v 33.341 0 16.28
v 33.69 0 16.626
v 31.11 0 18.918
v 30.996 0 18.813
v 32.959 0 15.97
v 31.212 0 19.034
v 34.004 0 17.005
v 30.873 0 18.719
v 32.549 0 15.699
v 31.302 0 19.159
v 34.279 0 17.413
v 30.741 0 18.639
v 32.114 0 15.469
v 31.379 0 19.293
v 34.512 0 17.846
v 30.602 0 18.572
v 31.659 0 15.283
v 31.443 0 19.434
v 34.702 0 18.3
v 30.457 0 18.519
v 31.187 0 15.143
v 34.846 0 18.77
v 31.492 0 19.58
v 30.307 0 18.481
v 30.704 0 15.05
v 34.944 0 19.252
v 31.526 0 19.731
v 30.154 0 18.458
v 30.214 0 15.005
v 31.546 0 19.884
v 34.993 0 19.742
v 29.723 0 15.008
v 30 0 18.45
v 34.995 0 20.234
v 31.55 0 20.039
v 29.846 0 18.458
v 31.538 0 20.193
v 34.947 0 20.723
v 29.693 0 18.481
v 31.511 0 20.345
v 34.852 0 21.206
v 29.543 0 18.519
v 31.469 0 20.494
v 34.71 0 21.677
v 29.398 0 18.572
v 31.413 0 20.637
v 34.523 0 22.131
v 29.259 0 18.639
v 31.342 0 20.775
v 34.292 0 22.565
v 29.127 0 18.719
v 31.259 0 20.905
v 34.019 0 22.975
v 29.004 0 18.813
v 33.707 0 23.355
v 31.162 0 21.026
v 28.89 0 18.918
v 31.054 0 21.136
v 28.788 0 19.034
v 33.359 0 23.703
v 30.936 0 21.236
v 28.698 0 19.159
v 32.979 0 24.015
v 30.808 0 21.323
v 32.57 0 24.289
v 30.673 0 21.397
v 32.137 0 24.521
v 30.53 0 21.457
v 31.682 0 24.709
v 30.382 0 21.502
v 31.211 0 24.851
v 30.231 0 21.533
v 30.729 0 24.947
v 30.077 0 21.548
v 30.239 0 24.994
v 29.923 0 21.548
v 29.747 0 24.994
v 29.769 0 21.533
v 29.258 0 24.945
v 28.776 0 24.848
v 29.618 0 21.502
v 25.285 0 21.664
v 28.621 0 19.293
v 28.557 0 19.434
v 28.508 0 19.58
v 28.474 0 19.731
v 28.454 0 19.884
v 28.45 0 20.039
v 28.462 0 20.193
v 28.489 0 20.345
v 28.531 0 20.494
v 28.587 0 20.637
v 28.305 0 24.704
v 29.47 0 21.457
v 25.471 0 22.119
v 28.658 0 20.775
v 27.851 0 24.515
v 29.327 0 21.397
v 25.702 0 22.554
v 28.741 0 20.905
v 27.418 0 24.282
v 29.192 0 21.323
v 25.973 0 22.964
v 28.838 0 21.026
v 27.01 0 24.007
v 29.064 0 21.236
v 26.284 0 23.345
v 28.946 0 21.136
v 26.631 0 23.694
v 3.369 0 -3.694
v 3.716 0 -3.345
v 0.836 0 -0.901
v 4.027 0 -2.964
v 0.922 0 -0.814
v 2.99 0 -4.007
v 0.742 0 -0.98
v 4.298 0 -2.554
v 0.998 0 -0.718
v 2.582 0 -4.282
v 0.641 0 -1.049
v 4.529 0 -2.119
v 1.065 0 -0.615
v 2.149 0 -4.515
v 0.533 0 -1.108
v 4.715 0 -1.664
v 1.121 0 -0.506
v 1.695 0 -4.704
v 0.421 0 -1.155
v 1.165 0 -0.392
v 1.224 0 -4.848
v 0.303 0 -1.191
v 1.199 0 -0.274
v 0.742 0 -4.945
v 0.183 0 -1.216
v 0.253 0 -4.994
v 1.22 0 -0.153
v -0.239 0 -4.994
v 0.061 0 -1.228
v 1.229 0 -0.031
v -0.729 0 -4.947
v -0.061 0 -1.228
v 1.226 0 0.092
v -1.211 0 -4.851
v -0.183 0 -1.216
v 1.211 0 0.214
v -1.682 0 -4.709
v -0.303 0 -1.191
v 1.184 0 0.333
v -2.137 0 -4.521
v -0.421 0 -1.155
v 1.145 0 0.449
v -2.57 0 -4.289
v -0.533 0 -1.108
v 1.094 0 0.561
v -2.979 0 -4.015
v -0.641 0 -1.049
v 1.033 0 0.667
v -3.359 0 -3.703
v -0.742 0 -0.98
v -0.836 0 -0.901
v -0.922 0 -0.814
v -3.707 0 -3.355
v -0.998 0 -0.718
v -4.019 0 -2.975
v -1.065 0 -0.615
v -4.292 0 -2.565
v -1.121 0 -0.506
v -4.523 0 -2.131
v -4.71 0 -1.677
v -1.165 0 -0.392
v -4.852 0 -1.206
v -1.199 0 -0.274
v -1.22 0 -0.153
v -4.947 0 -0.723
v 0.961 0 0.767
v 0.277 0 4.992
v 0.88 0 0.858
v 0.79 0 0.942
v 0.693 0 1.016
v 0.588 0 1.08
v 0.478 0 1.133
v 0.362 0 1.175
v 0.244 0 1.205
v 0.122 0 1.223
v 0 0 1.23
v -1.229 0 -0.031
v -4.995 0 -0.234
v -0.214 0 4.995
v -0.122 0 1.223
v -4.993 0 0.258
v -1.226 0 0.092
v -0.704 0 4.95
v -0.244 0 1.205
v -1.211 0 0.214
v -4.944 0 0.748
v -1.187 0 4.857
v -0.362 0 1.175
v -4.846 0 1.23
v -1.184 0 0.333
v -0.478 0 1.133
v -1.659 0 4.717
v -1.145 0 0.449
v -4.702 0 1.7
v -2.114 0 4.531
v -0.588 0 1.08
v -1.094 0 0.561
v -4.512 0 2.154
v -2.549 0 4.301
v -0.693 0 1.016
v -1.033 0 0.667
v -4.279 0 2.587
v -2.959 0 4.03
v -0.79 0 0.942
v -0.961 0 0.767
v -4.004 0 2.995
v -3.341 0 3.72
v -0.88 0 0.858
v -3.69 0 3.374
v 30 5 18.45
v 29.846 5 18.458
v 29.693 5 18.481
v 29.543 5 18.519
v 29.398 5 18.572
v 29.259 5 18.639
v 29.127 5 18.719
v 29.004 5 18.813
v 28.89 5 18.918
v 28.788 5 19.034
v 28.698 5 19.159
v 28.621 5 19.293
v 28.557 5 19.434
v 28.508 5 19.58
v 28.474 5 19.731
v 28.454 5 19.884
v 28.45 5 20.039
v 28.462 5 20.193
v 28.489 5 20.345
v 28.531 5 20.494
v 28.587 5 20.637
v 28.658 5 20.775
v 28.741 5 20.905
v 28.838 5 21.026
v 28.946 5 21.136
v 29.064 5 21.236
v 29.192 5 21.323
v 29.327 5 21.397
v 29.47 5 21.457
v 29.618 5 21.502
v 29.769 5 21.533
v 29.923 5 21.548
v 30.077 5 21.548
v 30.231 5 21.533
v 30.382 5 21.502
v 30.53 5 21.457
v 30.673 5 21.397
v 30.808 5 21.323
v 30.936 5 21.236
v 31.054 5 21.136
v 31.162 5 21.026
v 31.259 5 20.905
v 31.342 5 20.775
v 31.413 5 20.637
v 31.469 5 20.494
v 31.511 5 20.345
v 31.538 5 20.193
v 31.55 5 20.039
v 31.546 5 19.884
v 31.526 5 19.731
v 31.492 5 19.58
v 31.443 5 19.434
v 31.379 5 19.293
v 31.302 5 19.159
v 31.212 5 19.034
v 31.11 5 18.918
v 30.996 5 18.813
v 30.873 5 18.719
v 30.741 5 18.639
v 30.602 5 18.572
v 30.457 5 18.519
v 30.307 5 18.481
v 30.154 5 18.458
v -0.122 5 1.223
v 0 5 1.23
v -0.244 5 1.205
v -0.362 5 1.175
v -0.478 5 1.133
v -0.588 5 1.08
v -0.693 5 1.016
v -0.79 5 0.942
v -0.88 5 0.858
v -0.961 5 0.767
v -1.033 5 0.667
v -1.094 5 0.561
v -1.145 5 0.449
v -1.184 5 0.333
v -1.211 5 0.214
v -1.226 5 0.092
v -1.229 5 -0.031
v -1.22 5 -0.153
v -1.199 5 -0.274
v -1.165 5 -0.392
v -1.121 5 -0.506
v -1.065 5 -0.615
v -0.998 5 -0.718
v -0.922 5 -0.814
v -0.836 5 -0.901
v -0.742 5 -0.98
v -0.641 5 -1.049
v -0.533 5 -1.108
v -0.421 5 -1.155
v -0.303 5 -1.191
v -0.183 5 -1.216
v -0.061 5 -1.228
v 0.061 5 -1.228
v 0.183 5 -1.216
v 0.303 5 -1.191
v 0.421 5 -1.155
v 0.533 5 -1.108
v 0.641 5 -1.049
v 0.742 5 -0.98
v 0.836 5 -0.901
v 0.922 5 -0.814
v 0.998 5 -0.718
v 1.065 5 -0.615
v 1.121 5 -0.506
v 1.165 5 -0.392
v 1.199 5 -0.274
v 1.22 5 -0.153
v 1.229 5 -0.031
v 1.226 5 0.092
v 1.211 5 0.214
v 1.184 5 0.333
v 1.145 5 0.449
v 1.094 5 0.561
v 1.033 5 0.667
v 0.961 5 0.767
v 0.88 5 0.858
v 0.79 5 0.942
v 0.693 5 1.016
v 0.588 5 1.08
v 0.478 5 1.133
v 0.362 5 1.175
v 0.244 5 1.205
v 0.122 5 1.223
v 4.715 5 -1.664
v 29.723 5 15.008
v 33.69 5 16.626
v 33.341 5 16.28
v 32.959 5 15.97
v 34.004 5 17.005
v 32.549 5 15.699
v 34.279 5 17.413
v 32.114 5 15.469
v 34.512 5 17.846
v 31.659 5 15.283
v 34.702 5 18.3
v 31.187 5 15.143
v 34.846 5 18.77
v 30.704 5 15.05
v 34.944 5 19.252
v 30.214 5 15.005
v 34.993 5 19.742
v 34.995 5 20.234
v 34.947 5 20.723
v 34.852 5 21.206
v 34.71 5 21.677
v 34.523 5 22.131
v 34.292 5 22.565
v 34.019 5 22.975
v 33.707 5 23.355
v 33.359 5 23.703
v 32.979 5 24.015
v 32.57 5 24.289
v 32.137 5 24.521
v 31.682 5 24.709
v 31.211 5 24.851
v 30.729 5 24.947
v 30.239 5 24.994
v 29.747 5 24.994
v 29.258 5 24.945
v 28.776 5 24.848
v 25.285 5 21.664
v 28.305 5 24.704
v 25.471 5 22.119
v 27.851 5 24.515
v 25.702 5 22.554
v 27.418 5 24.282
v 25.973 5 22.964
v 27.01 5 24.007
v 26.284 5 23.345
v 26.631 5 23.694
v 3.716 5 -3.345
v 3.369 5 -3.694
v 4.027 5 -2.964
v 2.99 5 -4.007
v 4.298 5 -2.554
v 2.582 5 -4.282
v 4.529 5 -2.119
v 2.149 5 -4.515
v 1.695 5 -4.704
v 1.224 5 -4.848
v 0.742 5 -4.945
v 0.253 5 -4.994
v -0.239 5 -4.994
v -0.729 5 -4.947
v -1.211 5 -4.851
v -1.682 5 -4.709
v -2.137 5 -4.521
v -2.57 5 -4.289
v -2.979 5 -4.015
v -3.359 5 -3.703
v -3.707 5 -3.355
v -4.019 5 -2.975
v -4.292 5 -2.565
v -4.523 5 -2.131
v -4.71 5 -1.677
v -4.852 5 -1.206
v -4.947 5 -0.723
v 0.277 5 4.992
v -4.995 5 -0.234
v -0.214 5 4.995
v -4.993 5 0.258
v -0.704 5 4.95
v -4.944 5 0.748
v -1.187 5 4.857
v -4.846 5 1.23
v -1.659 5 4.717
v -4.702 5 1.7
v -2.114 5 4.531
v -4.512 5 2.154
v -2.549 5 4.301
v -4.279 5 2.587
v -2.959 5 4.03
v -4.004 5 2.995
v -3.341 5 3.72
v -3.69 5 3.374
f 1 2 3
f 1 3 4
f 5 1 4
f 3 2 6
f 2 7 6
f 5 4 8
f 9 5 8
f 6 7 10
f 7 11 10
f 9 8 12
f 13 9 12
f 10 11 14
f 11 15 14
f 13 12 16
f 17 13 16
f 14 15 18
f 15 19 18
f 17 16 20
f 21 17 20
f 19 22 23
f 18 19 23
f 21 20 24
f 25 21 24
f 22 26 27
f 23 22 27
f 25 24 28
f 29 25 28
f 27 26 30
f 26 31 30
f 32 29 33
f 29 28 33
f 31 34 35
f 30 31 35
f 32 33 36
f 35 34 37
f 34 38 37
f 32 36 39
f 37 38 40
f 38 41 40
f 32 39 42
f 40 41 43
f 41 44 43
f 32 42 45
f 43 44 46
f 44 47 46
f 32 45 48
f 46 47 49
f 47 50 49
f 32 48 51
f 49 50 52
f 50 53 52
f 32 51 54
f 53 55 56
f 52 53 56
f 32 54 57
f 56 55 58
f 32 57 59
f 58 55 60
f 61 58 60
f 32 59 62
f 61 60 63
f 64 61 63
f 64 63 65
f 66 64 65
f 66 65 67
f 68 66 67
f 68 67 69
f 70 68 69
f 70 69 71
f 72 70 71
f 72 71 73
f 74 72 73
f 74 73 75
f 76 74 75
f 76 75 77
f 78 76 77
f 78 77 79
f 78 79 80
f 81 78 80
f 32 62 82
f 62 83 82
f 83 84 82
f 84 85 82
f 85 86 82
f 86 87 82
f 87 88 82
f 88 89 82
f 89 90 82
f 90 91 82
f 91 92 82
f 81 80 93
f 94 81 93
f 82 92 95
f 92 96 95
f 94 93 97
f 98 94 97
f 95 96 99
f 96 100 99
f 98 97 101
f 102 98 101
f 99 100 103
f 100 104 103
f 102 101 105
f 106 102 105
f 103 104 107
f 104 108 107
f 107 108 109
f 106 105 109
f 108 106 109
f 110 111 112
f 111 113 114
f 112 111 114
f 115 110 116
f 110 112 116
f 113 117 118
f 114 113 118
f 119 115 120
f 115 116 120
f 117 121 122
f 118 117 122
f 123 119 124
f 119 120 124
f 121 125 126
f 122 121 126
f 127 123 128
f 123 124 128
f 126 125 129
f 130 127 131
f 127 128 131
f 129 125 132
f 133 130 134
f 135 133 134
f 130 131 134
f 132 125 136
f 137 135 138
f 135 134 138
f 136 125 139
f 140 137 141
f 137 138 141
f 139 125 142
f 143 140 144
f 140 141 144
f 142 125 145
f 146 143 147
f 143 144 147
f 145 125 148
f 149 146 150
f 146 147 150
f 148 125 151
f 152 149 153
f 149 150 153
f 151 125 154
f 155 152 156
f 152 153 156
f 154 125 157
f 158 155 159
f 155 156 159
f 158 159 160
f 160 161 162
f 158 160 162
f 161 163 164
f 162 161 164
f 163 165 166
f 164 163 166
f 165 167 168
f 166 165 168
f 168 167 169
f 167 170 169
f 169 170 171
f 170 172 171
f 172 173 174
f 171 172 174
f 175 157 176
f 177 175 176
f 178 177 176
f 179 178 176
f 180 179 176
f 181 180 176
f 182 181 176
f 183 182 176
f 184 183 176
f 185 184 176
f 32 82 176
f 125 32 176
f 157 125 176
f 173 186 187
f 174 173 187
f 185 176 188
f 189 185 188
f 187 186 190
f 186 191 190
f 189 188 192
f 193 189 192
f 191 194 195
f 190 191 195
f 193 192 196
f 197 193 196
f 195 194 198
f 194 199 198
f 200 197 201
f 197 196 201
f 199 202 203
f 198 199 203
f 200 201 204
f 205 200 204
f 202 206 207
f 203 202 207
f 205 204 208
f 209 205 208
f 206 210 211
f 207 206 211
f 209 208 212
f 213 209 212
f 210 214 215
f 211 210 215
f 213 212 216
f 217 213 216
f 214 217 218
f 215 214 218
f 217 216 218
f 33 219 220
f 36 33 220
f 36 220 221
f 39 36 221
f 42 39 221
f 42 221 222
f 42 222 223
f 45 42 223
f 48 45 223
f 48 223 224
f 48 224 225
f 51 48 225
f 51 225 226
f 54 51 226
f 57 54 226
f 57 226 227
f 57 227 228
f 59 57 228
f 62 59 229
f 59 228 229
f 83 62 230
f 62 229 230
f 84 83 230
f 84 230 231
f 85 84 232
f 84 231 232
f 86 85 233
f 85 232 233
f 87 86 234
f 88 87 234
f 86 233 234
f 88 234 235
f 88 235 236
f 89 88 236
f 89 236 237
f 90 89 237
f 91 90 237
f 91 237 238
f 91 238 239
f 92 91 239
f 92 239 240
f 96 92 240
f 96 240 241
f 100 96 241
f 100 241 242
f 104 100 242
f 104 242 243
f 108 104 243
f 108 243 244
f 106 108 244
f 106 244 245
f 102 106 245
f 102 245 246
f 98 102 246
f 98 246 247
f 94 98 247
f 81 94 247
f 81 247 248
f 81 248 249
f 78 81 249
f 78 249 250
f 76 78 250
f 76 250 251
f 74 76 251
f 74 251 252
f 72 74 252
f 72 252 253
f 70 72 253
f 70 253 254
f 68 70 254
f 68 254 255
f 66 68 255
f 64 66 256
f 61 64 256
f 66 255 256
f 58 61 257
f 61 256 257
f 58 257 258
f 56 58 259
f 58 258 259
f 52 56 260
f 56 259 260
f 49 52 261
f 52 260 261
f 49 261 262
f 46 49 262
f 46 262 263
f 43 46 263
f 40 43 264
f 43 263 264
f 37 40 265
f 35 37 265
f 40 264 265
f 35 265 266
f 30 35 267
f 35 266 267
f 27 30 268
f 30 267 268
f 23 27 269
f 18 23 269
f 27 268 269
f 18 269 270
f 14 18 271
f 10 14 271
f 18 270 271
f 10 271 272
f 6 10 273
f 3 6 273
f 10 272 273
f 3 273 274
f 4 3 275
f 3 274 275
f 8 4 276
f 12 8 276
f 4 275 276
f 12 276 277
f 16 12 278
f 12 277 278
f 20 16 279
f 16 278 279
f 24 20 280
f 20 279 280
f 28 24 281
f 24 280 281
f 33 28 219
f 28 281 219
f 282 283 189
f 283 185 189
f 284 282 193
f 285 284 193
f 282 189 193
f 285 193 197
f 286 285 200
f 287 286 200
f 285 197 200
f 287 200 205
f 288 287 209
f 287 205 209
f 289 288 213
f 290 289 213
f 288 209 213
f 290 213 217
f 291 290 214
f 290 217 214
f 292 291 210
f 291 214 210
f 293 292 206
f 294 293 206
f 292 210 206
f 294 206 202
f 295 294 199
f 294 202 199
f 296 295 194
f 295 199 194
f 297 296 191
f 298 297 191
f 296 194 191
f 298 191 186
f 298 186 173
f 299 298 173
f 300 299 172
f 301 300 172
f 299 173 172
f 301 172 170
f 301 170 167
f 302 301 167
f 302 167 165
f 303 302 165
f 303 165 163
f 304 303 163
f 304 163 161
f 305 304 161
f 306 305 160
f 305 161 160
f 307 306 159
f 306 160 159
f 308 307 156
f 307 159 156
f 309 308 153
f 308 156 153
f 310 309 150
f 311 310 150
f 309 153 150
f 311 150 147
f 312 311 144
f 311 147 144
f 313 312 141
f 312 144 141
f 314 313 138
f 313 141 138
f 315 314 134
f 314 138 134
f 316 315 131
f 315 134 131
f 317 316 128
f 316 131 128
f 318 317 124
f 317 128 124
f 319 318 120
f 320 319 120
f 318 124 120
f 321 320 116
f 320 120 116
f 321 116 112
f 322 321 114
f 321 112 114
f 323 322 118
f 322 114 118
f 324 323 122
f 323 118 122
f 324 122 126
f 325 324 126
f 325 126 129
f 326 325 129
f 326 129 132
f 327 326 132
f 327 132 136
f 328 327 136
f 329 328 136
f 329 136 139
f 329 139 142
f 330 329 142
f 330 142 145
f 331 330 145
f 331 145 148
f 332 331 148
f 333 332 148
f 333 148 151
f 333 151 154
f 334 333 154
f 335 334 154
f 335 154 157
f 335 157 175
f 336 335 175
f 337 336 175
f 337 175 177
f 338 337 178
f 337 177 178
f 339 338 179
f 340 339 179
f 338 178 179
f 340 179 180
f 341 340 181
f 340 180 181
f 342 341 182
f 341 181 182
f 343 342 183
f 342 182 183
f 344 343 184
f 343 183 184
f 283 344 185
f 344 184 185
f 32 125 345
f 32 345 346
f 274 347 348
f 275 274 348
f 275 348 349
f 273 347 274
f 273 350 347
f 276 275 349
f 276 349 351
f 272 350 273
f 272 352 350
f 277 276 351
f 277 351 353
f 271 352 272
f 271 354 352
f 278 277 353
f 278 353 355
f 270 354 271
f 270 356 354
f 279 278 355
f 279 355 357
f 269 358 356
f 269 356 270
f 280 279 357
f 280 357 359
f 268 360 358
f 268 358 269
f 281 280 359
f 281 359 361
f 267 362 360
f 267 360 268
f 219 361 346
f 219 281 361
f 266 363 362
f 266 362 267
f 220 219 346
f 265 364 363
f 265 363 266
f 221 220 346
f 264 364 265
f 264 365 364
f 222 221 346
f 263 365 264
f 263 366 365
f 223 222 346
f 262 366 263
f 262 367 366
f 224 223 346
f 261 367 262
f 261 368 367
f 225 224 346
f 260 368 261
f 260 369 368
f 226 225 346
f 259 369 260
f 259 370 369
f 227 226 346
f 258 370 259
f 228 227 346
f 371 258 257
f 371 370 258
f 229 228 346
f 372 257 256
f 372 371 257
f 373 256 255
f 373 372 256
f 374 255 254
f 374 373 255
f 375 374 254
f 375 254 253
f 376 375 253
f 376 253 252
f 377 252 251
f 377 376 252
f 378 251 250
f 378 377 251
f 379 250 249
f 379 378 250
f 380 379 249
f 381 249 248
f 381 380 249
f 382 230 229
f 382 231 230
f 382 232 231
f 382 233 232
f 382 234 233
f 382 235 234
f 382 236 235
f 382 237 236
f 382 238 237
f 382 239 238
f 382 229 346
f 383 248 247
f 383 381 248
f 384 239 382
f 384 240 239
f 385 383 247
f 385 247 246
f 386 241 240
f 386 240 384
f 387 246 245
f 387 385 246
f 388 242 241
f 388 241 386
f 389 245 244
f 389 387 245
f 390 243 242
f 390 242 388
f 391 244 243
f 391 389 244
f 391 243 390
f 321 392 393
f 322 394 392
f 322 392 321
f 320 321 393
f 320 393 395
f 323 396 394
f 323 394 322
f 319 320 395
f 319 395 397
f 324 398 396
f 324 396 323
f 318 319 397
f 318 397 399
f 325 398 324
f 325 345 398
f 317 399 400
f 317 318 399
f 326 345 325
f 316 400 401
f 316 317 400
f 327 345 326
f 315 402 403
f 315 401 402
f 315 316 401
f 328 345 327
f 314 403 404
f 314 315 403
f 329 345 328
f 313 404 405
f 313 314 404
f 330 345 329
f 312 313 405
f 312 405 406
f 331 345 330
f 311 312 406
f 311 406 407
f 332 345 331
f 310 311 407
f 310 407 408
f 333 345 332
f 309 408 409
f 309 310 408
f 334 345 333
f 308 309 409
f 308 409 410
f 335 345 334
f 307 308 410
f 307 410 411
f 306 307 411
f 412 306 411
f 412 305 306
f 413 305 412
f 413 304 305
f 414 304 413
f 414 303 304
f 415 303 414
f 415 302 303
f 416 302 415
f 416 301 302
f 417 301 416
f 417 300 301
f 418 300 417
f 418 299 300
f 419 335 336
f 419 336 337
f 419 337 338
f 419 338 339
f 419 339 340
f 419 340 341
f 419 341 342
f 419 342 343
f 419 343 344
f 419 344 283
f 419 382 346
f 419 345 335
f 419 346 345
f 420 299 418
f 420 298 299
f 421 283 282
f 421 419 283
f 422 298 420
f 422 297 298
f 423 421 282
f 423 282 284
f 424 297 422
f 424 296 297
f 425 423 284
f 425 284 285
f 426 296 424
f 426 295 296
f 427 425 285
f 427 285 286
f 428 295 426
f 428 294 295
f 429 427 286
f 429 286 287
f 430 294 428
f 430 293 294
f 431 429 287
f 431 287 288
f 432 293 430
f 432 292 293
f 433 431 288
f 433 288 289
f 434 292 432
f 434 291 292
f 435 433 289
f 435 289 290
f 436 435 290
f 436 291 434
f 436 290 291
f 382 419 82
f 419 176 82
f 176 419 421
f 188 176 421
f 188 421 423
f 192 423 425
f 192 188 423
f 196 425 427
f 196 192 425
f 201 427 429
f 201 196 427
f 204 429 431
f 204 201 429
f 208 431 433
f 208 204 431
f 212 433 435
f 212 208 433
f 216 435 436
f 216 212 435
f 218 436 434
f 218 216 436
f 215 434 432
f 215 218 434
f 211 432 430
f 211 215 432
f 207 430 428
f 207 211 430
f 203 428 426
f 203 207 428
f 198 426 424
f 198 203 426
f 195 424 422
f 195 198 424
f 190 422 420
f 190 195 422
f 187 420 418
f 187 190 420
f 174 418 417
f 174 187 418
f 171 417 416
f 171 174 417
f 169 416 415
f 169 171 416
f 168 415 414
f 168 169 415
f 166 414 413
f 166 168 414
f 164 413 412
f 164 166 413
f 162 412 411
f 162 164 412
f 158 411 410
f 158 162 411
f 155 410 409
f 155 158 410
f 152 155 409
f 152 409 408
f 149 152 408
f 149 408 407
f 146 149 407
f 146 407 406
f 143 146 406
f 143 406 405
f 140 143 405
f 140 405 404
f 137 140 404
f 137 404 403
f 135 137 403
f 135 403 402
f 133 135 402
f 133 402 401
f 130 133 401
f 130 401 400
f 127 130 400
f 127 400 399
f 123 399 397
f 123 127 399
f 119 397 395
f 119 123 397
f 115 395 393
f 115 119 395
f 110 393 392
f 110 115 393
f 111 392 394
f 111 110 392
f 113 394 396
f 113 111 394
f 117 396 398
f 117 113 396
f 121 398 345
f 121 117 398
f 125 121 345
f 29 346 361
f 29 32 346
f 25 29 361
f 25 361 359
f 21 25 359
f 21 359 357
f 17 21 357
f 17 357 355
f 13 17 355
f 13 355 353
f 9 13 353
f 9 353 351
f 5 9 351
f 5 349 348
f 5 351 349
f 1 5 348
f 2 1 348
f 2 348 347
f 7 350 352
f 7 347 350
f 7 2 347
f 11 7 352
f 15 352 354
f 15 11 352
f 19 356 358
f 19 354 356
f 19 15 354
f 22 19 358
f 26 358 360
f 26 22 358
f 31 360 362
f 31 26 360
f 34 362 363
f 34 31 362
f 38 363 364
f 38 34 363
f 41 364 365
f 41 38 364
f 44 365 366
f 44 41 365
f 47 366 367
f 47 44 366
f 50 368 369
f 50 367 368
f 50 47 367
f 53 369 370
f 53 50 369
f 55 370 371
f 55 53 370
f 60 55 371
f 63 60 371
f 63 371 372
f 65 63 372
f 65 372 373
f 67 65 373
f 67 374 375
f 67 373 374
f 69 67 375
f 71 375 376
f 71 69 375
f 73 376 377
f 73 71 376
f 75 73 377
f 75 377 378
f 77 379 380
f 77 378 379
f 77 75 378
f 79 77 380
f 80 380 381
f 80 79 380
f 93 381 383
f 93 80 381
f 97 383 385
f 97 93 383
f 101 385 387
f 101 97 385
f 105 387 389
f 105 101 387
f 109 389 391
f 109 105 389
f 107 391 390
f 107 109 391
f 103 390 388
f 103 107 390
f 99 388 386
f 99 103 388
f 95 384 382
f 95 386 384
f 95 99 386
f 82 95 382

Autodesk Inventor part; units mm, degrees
ref_plane "YZ Plane" through (0, 0, 0) normal (1, 0, 0) x (0, 1, 0)
ref_plane "XZ Plane" through (0, 0, 0) normal (0, 1, 0) x (-1, 0, 0)
sketch "Sketch1" plane through (0, 0, 0) normal (0, 1, 0) x (-1, 0, 0)
  circle A0 centre (0, 0) radius 5
  circle A1 centre (-30, 20) radius 5
  line L0 (-4.715, -1.6641) -> (-29.7226, 15.0077)
  line L1 (-0.2774, 4.9923) -> (-25.285, 21.6641)
  line L2 (0, 0) -> (-30, 0) construction
  line L3 (-30, 0) -> (-30, 20) construction
  line L4 (0, 0) -> (-30, 20) construction
  dimension "d0" = 10
  dimension "d1" = 10
  dimension "d2" = 4
  dimension "d3" = 4
  dimension "d4" = 30
  dimension "d5" = 20
extrude "Extrusion1" add sketch "Sketch1" along normal blind 5
sketch "Sketch2" plane through (0, 0, 0) normal (0, -1, 0) x (1, 0, 0)
  line L0 (0, 0) -> (30, 20) construction
  arc A0 (29.7226, 15.0077) -> (25.285, 21.6641) centre (30, 20) ccw projected
  line L1 (0.2774, 4.9923) -> (25.285, 21.6641) projected
  arc A1 (0.2774, 4.9923) -> (4.715, -1.6641) centre (0, 0) ccw projected
  line L2 (29.7226, 15.0077) -> (4.715, -1.6641) projected
hole "Hole1" at (30, 0, 20) direction (0, 1, 0) diameter 3.1 end through all
ref_plane "Work Plane1" through (0, 1.5, 0) normal (0, 1, 0) x (1, 0, 0)
sketch "Sketch4" plane through (0, 5, 0) normal (0, 1, 0) x (1, 0, 0)
  circle A0 centre (30, -20) radius 1.55 projected
  arc A1 (25.285, -21.6641) -> (29.7226, -15.0077) centre (30, -20) ccw projected
  line L0 (29.7226, -15.0077) -> (4.715, 1.6641) projected
  arc A2 (4.715, 1.6641) -> (0.2774, -4.9923) centre (0, 0) ccw projected
  line L1 (0.2774, -4.9923) -> (25.285, -21.6641) projected
hole "Hole2" at (0, 5, 0) direction (0, -1, 0) diameter 2.459 end through all thread size "M3x0.5" class "6H" standard "ISO Metric profile"
properties part number "gripper_hand_connector"
